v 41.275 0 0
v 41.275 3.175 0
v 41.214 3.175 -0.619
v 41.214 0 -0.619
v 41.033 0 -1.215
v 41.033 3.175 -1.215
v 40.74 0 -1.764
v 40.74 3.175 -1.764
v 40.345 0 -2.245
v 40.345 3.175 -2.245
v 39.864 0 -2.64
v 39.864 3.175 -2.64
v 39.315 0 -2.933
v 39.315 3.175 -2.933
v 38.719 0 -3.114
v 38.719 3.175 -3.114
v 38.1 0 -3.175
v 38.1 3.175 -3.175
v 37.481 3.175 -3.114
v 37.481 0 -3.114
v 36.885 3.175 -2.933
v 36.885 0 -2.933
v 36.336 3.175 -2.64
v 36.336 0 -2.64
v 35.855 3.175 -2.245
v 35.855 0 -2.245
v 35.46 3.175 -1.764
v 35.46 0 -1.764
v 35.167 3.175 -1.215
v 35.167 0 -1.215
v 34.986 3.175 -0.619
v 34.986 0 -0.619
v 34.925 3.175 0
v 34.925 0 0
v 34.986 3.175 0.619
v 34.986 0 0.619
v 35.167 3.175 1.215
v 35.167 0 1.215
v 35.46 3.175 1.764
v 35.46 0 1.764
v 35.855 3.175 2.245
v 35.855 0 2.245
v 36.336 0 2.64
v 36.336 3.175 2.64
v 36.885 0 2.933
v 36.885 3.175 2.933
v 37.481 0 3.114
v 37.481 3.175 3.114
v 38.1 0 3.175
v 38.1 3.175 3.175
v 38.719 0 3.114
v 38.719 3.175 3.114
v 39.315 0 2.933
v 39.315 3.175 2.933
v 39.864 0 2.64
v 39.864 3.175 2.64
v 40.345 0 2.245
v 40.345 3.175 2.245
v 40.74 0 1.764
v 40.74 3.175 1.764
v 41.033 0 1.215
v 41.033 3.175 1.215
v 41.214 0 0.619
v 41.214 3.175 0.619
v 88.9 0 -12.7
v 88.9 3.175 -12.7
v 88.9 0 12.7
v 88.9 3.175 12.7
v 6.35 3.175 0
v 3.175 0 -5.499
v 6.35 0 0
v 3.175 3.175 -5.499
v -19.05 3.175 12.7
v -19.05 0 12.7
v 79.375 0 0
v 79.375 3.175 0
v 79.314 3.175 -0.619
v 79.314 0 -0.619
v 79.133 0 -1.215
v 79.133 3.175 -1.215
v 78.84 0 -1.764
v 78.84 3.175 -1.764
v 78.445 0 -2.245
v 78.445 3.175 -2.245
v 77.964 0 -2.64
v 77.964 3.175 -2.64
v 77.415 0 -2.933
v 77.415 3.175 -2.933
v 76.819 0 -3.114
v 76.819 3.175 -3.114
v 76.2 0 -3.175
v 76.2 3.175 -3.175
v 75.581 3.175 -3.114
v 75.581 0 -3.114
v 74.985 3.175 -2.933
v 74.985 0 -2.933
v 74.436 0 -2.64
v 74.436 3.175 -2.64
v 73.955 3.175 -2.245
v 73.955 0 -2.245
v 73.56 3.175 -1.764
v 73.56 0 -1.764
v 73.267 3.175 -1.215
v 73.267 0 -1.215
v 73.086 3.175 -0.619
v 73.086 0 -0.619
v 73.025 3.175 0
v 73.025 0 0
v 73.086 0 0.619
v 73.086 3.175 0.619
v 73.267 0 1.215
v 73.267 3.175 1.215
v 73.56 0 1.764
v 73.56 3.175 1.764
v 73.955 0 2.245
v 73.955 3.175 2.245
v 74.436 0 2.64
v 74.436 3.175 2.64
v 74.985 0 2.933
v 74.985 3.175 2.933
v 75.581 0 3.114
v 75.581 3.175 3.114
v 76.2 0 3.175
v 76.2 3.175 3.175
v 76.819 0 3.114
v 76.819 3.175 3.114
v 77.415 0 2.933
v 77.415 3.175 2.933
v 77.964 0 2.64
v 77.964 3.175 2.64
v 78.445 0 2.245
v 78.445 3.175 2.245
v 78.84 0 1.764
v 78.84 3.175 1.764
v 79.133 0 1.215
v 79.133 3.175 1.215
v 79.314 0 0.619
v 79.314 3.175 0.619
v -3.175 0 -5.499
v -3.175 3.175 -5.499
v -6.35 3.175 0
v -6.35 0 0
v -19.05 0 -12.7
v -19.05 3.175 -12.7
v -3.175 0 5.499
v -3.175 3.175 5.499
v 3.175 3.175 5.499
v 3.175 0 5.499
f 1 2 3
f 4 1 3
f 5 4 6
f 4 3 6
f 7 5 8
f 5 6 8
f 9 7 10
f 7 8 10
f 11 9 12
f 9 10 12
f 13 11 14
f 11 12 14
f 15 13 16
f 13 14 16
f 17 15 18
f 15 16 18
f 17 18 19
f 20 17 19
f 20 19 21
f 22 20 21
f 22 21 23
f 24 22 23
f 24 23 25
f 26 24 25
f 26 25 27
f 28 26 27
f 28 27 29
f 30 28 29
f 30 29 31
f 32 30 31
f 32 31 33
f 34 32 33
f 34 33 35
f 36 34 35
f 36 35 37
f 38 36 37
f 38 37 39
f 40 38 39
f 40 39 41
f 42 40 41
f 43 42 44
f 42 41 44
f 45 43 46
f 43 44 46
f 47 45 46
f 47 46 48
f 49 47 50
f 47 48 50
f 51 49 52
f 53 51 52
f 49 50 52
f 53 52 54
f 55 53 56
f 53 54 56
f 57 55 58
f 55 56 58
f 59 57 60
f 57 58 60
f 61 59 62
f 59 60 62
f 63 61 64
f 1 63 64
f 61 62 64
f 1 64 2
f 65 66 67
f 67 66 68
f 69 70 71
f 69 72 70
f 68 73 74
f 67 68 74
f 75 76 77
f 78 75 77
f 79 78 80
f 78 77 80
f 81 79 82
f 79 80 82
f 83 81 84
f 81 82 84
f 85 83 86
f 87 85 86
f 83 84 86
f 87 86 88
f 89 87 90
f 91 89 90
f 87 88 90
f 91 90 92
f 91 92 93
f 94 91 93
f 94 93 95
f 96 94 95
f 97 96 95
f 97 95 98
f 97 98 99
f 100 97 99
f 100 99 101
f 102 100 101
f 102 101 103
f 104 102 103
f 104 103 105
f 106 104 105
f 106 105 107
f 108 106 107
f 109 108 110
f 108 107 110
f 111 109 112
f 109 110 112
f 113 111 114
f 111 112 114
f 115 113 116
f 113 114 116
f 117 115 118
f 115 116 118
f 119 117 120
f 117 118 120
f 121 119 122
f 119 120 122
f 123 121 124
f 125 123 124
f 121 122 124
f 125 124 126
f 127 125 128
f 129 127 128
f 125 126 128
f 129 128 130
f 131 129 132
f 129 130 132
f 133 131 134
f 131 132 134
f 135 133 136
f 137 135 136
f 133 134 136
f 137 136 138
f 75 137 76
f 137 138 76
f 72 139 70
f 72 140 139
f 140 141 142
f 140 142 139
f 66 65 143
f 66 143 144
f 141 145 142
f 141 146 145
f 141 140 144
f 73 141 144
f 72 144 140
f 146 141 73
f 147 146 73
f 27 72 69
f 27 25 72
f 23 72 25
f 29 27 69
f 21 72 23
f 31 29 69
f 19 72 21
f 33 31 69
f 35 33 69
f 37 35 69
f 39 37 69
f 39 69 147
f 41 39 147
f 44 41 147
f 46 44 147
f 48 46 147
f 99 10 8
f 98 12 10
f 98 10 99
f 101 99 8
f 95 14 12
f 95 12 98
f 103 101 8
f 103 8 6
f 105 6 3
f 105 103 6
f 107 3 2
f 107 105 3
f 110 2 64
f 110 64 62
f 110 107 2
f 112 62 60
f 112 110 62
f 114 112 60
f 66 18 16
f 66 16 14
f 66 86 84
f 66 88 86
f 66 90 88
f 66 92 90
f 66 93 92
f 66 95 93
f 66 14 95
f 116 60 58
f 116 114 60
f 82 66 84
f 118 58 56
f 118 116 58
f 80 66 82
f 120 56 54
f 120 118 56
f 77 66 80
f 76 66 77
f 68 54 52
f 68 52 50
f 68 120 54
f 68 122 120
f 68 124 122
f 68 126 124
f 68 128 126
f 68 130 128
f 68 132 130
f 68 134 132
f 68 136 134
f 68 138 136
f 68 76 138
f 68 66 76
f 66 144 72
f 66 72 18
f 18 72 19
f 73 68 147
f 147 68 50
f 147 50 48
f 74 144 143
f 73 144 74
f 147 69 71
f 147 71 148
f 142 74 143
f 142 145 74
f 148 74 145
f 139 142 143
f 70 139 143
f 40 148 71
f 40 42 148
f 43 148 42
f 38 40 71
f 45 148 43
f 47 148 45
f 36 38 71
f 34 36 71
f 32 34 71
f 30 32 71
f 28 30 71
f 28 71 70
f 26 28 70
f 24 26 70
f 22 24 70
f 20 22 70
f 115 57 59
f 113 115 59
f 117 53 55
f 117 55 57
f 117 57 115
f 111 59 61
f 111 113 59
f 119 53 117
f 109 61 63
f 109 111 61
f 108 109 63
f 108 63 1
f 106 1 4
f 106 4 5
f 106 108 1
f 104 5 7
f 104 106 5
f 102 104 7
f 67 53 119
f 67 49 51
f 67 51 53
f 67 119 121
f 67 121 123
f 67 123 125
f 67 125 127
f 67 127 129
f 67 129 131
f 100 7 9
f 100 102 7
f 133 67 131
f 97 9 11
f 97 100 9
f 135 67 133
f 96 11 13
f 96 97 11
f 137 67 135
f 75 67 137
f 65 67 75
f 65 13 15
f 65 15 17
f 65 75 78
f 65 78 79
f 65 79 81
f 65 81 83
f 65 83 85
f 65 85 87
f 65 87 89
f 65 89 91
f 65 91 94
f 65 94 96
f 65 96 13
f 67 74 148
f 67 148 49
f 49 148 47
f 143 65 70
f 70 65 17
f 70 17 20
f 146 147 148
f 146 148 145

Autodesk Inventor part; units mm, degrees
ref_plane "YZ Plane" through (0, 0, 0) normal (1, 0, 0) x (0, 1, 0)
ref_plane "XZ Plane" through (0, 0, 0) normal (0, 1, 0) x (-1, 0, 0)
ref_plane "XY Plane" through (0, 0, 0) normal (0, 0, 1) x (1, 0, 0)
sketch "Sketch1" plane through (0, 0, 0) normal (0, 1, 0) x (-1, 0, 0)
  line L0 (50.8, 12.7) -> (-50.8, 12.7)
  line L1 (-50.8, 12.7) -> (-50.8, -12.7)
  line L2 (-50.8, -12.7) -> (50.8, -12.7)
  line L3 (50.8, -12.7) -> (50.8, 12.7)
  line L4 (50.8, 12.7) -> (-50.8, -12.7) construction
  line L5 (-50.8, 12.7) -> (50.8, -12.7) construction
  point P0 (0, 0)
  dimension "d0" = 101.6
  dimension "d1" = 25.4
extrude "Extrusion1" add sketch "Sketch1" along normal blind 3.175
sketch "Sketch2" plane through (0, 3.175, 0) normal (0, 1, 0) x (1, 0, 0)
  line L0 (-50.8, 12.7) -> (-50.8, -12.7) projected
  circle A0 centre (0, 0) radius 6.35
  line L1 (0, 0) -> (0, 6.35)
  line L2 (0, 0) -> (6.35, 0)
  line L3 (6.35, 0) -> (3.175, -5.4993)
  line L4 (3.175, -5.4993) -> (-3.175, -5.4993)
  line L5 (-3.175, -5.4993) -> (-6.35, 0)
  line L6 (-6.35, 0) -> (-3.175, 5.4993)
  line L7 (-3.175, 5.4993) -> (3.175, 5.4993)
  line L8 (3.175, 5.4993) -> (6.35, 0)
  dimension "d4" = 12.7
extrude "Extrusion2" cut sketch "Sketch2" against normal blind 3.175 contours L3 L4 L5 L6 L7 L1 L2 | L2 L1 L7 L8
sketch "Sketch3" plane through (0, 3.175, 0) normal (0, 1, 0) x (1, 0, 0)
  line L0 (50.8, 12.7) -> (-50.8, 12.7) projected
  line L1 (-50.8, 12.7) -> (-50.8, -12.7) projected
  line L2 (0, 0) -> (-38.1, 0)
  line L3 (-38.1, 0) -> (38.1, 0)
  circle A0 centre (-38.1, 0) radius 3.175
  circle A1 centre (38.1, 0) radius 3.175
  dimension "d7" = 38.1
  dimension "d8" = 76.2
  dimension "d9" = 0
  dimension "d10" = 6.35
  dimension "d11" = 6.35
extrude "Extrusion3" cut sketch "Sketch3" against normal blind 3.175
sketch "Sketch4" plane through (0, 3.175, 0) normal (0, 1, 0) x (1, 0, 0)
  circle A0 centre (-38.1, 0) radius 3.175 projected
  line L0 (-50.8, 12.7) -> (-12.7, 12.7)
  line L1 (-12.7, 12.7) -> (-12.7, -12.7)
  line L2 (-12.7, -12.7) -> (-50.8, -12.7)
  line L3 (-50.8, -12.7) -> (-50.8, 12.7)
  point P0 (0, 0)
  dimension "d14" = 38.1
  dimension "d15" = 25.4
extrude "Extrusion4" cut sketch "Sketch4" against normal blind 25.4
sketch "Sketch5" plane through (0, 3.175, 0) normal (0, 1, 0) x (1, 0, 0)
  circle A0 centre (38.1, 0) radius 3.175 projected
  line L0 (3.175, -5.4993) -> (-3.175, -5.4993) projected
  line L1 (38.1, 0) -> (76.2, 0)
  line L2 (38.1, 0) -> (76.2, 0) construction
  circle A1 centre (76.2, 0) radius 3.175
  line L3 (50.8, 12.7) -> (88.9, 12.7)
  line L4 (88.9, 12.7) -> (88.9, -12.7)
  line L5 (88.9, -12.7) -> (50.8, -12.7)
  line L6 (50.8, -12.7) -> (50.8, 12.7)
  point P0 (0, 0)
  dimension "d18" = 38.1
  dimension "d19" = 0
  dimension "d20" = 6.35
  dimension "d21" = 38.1
  dimension "d22" = 25.4
extrude "Extrusion5" add sketch "Sketch5" against normal blind 3.175 contours L6 L3 L4 L5
sketch "Sketch6" plane through (-12.7, 3.175, -12.7) normal (-1, 0, 0) x (0, 0, 1)
  line L0 (25.4, -3.175) -> (0, -3.175) projected
  line L1 (25.4, 0) -> (25.4, -3.175) projected
  line L2 (0, 0) -> (25.4, 0) projected
  line L3 (0, -3.175) -> (0, 0) projected
  point P0 (12.7, -3.175)
extrude "Extrusion6" add sketch "Sketch6" along normal blind 6.35
properties part number "ArmBrace"
